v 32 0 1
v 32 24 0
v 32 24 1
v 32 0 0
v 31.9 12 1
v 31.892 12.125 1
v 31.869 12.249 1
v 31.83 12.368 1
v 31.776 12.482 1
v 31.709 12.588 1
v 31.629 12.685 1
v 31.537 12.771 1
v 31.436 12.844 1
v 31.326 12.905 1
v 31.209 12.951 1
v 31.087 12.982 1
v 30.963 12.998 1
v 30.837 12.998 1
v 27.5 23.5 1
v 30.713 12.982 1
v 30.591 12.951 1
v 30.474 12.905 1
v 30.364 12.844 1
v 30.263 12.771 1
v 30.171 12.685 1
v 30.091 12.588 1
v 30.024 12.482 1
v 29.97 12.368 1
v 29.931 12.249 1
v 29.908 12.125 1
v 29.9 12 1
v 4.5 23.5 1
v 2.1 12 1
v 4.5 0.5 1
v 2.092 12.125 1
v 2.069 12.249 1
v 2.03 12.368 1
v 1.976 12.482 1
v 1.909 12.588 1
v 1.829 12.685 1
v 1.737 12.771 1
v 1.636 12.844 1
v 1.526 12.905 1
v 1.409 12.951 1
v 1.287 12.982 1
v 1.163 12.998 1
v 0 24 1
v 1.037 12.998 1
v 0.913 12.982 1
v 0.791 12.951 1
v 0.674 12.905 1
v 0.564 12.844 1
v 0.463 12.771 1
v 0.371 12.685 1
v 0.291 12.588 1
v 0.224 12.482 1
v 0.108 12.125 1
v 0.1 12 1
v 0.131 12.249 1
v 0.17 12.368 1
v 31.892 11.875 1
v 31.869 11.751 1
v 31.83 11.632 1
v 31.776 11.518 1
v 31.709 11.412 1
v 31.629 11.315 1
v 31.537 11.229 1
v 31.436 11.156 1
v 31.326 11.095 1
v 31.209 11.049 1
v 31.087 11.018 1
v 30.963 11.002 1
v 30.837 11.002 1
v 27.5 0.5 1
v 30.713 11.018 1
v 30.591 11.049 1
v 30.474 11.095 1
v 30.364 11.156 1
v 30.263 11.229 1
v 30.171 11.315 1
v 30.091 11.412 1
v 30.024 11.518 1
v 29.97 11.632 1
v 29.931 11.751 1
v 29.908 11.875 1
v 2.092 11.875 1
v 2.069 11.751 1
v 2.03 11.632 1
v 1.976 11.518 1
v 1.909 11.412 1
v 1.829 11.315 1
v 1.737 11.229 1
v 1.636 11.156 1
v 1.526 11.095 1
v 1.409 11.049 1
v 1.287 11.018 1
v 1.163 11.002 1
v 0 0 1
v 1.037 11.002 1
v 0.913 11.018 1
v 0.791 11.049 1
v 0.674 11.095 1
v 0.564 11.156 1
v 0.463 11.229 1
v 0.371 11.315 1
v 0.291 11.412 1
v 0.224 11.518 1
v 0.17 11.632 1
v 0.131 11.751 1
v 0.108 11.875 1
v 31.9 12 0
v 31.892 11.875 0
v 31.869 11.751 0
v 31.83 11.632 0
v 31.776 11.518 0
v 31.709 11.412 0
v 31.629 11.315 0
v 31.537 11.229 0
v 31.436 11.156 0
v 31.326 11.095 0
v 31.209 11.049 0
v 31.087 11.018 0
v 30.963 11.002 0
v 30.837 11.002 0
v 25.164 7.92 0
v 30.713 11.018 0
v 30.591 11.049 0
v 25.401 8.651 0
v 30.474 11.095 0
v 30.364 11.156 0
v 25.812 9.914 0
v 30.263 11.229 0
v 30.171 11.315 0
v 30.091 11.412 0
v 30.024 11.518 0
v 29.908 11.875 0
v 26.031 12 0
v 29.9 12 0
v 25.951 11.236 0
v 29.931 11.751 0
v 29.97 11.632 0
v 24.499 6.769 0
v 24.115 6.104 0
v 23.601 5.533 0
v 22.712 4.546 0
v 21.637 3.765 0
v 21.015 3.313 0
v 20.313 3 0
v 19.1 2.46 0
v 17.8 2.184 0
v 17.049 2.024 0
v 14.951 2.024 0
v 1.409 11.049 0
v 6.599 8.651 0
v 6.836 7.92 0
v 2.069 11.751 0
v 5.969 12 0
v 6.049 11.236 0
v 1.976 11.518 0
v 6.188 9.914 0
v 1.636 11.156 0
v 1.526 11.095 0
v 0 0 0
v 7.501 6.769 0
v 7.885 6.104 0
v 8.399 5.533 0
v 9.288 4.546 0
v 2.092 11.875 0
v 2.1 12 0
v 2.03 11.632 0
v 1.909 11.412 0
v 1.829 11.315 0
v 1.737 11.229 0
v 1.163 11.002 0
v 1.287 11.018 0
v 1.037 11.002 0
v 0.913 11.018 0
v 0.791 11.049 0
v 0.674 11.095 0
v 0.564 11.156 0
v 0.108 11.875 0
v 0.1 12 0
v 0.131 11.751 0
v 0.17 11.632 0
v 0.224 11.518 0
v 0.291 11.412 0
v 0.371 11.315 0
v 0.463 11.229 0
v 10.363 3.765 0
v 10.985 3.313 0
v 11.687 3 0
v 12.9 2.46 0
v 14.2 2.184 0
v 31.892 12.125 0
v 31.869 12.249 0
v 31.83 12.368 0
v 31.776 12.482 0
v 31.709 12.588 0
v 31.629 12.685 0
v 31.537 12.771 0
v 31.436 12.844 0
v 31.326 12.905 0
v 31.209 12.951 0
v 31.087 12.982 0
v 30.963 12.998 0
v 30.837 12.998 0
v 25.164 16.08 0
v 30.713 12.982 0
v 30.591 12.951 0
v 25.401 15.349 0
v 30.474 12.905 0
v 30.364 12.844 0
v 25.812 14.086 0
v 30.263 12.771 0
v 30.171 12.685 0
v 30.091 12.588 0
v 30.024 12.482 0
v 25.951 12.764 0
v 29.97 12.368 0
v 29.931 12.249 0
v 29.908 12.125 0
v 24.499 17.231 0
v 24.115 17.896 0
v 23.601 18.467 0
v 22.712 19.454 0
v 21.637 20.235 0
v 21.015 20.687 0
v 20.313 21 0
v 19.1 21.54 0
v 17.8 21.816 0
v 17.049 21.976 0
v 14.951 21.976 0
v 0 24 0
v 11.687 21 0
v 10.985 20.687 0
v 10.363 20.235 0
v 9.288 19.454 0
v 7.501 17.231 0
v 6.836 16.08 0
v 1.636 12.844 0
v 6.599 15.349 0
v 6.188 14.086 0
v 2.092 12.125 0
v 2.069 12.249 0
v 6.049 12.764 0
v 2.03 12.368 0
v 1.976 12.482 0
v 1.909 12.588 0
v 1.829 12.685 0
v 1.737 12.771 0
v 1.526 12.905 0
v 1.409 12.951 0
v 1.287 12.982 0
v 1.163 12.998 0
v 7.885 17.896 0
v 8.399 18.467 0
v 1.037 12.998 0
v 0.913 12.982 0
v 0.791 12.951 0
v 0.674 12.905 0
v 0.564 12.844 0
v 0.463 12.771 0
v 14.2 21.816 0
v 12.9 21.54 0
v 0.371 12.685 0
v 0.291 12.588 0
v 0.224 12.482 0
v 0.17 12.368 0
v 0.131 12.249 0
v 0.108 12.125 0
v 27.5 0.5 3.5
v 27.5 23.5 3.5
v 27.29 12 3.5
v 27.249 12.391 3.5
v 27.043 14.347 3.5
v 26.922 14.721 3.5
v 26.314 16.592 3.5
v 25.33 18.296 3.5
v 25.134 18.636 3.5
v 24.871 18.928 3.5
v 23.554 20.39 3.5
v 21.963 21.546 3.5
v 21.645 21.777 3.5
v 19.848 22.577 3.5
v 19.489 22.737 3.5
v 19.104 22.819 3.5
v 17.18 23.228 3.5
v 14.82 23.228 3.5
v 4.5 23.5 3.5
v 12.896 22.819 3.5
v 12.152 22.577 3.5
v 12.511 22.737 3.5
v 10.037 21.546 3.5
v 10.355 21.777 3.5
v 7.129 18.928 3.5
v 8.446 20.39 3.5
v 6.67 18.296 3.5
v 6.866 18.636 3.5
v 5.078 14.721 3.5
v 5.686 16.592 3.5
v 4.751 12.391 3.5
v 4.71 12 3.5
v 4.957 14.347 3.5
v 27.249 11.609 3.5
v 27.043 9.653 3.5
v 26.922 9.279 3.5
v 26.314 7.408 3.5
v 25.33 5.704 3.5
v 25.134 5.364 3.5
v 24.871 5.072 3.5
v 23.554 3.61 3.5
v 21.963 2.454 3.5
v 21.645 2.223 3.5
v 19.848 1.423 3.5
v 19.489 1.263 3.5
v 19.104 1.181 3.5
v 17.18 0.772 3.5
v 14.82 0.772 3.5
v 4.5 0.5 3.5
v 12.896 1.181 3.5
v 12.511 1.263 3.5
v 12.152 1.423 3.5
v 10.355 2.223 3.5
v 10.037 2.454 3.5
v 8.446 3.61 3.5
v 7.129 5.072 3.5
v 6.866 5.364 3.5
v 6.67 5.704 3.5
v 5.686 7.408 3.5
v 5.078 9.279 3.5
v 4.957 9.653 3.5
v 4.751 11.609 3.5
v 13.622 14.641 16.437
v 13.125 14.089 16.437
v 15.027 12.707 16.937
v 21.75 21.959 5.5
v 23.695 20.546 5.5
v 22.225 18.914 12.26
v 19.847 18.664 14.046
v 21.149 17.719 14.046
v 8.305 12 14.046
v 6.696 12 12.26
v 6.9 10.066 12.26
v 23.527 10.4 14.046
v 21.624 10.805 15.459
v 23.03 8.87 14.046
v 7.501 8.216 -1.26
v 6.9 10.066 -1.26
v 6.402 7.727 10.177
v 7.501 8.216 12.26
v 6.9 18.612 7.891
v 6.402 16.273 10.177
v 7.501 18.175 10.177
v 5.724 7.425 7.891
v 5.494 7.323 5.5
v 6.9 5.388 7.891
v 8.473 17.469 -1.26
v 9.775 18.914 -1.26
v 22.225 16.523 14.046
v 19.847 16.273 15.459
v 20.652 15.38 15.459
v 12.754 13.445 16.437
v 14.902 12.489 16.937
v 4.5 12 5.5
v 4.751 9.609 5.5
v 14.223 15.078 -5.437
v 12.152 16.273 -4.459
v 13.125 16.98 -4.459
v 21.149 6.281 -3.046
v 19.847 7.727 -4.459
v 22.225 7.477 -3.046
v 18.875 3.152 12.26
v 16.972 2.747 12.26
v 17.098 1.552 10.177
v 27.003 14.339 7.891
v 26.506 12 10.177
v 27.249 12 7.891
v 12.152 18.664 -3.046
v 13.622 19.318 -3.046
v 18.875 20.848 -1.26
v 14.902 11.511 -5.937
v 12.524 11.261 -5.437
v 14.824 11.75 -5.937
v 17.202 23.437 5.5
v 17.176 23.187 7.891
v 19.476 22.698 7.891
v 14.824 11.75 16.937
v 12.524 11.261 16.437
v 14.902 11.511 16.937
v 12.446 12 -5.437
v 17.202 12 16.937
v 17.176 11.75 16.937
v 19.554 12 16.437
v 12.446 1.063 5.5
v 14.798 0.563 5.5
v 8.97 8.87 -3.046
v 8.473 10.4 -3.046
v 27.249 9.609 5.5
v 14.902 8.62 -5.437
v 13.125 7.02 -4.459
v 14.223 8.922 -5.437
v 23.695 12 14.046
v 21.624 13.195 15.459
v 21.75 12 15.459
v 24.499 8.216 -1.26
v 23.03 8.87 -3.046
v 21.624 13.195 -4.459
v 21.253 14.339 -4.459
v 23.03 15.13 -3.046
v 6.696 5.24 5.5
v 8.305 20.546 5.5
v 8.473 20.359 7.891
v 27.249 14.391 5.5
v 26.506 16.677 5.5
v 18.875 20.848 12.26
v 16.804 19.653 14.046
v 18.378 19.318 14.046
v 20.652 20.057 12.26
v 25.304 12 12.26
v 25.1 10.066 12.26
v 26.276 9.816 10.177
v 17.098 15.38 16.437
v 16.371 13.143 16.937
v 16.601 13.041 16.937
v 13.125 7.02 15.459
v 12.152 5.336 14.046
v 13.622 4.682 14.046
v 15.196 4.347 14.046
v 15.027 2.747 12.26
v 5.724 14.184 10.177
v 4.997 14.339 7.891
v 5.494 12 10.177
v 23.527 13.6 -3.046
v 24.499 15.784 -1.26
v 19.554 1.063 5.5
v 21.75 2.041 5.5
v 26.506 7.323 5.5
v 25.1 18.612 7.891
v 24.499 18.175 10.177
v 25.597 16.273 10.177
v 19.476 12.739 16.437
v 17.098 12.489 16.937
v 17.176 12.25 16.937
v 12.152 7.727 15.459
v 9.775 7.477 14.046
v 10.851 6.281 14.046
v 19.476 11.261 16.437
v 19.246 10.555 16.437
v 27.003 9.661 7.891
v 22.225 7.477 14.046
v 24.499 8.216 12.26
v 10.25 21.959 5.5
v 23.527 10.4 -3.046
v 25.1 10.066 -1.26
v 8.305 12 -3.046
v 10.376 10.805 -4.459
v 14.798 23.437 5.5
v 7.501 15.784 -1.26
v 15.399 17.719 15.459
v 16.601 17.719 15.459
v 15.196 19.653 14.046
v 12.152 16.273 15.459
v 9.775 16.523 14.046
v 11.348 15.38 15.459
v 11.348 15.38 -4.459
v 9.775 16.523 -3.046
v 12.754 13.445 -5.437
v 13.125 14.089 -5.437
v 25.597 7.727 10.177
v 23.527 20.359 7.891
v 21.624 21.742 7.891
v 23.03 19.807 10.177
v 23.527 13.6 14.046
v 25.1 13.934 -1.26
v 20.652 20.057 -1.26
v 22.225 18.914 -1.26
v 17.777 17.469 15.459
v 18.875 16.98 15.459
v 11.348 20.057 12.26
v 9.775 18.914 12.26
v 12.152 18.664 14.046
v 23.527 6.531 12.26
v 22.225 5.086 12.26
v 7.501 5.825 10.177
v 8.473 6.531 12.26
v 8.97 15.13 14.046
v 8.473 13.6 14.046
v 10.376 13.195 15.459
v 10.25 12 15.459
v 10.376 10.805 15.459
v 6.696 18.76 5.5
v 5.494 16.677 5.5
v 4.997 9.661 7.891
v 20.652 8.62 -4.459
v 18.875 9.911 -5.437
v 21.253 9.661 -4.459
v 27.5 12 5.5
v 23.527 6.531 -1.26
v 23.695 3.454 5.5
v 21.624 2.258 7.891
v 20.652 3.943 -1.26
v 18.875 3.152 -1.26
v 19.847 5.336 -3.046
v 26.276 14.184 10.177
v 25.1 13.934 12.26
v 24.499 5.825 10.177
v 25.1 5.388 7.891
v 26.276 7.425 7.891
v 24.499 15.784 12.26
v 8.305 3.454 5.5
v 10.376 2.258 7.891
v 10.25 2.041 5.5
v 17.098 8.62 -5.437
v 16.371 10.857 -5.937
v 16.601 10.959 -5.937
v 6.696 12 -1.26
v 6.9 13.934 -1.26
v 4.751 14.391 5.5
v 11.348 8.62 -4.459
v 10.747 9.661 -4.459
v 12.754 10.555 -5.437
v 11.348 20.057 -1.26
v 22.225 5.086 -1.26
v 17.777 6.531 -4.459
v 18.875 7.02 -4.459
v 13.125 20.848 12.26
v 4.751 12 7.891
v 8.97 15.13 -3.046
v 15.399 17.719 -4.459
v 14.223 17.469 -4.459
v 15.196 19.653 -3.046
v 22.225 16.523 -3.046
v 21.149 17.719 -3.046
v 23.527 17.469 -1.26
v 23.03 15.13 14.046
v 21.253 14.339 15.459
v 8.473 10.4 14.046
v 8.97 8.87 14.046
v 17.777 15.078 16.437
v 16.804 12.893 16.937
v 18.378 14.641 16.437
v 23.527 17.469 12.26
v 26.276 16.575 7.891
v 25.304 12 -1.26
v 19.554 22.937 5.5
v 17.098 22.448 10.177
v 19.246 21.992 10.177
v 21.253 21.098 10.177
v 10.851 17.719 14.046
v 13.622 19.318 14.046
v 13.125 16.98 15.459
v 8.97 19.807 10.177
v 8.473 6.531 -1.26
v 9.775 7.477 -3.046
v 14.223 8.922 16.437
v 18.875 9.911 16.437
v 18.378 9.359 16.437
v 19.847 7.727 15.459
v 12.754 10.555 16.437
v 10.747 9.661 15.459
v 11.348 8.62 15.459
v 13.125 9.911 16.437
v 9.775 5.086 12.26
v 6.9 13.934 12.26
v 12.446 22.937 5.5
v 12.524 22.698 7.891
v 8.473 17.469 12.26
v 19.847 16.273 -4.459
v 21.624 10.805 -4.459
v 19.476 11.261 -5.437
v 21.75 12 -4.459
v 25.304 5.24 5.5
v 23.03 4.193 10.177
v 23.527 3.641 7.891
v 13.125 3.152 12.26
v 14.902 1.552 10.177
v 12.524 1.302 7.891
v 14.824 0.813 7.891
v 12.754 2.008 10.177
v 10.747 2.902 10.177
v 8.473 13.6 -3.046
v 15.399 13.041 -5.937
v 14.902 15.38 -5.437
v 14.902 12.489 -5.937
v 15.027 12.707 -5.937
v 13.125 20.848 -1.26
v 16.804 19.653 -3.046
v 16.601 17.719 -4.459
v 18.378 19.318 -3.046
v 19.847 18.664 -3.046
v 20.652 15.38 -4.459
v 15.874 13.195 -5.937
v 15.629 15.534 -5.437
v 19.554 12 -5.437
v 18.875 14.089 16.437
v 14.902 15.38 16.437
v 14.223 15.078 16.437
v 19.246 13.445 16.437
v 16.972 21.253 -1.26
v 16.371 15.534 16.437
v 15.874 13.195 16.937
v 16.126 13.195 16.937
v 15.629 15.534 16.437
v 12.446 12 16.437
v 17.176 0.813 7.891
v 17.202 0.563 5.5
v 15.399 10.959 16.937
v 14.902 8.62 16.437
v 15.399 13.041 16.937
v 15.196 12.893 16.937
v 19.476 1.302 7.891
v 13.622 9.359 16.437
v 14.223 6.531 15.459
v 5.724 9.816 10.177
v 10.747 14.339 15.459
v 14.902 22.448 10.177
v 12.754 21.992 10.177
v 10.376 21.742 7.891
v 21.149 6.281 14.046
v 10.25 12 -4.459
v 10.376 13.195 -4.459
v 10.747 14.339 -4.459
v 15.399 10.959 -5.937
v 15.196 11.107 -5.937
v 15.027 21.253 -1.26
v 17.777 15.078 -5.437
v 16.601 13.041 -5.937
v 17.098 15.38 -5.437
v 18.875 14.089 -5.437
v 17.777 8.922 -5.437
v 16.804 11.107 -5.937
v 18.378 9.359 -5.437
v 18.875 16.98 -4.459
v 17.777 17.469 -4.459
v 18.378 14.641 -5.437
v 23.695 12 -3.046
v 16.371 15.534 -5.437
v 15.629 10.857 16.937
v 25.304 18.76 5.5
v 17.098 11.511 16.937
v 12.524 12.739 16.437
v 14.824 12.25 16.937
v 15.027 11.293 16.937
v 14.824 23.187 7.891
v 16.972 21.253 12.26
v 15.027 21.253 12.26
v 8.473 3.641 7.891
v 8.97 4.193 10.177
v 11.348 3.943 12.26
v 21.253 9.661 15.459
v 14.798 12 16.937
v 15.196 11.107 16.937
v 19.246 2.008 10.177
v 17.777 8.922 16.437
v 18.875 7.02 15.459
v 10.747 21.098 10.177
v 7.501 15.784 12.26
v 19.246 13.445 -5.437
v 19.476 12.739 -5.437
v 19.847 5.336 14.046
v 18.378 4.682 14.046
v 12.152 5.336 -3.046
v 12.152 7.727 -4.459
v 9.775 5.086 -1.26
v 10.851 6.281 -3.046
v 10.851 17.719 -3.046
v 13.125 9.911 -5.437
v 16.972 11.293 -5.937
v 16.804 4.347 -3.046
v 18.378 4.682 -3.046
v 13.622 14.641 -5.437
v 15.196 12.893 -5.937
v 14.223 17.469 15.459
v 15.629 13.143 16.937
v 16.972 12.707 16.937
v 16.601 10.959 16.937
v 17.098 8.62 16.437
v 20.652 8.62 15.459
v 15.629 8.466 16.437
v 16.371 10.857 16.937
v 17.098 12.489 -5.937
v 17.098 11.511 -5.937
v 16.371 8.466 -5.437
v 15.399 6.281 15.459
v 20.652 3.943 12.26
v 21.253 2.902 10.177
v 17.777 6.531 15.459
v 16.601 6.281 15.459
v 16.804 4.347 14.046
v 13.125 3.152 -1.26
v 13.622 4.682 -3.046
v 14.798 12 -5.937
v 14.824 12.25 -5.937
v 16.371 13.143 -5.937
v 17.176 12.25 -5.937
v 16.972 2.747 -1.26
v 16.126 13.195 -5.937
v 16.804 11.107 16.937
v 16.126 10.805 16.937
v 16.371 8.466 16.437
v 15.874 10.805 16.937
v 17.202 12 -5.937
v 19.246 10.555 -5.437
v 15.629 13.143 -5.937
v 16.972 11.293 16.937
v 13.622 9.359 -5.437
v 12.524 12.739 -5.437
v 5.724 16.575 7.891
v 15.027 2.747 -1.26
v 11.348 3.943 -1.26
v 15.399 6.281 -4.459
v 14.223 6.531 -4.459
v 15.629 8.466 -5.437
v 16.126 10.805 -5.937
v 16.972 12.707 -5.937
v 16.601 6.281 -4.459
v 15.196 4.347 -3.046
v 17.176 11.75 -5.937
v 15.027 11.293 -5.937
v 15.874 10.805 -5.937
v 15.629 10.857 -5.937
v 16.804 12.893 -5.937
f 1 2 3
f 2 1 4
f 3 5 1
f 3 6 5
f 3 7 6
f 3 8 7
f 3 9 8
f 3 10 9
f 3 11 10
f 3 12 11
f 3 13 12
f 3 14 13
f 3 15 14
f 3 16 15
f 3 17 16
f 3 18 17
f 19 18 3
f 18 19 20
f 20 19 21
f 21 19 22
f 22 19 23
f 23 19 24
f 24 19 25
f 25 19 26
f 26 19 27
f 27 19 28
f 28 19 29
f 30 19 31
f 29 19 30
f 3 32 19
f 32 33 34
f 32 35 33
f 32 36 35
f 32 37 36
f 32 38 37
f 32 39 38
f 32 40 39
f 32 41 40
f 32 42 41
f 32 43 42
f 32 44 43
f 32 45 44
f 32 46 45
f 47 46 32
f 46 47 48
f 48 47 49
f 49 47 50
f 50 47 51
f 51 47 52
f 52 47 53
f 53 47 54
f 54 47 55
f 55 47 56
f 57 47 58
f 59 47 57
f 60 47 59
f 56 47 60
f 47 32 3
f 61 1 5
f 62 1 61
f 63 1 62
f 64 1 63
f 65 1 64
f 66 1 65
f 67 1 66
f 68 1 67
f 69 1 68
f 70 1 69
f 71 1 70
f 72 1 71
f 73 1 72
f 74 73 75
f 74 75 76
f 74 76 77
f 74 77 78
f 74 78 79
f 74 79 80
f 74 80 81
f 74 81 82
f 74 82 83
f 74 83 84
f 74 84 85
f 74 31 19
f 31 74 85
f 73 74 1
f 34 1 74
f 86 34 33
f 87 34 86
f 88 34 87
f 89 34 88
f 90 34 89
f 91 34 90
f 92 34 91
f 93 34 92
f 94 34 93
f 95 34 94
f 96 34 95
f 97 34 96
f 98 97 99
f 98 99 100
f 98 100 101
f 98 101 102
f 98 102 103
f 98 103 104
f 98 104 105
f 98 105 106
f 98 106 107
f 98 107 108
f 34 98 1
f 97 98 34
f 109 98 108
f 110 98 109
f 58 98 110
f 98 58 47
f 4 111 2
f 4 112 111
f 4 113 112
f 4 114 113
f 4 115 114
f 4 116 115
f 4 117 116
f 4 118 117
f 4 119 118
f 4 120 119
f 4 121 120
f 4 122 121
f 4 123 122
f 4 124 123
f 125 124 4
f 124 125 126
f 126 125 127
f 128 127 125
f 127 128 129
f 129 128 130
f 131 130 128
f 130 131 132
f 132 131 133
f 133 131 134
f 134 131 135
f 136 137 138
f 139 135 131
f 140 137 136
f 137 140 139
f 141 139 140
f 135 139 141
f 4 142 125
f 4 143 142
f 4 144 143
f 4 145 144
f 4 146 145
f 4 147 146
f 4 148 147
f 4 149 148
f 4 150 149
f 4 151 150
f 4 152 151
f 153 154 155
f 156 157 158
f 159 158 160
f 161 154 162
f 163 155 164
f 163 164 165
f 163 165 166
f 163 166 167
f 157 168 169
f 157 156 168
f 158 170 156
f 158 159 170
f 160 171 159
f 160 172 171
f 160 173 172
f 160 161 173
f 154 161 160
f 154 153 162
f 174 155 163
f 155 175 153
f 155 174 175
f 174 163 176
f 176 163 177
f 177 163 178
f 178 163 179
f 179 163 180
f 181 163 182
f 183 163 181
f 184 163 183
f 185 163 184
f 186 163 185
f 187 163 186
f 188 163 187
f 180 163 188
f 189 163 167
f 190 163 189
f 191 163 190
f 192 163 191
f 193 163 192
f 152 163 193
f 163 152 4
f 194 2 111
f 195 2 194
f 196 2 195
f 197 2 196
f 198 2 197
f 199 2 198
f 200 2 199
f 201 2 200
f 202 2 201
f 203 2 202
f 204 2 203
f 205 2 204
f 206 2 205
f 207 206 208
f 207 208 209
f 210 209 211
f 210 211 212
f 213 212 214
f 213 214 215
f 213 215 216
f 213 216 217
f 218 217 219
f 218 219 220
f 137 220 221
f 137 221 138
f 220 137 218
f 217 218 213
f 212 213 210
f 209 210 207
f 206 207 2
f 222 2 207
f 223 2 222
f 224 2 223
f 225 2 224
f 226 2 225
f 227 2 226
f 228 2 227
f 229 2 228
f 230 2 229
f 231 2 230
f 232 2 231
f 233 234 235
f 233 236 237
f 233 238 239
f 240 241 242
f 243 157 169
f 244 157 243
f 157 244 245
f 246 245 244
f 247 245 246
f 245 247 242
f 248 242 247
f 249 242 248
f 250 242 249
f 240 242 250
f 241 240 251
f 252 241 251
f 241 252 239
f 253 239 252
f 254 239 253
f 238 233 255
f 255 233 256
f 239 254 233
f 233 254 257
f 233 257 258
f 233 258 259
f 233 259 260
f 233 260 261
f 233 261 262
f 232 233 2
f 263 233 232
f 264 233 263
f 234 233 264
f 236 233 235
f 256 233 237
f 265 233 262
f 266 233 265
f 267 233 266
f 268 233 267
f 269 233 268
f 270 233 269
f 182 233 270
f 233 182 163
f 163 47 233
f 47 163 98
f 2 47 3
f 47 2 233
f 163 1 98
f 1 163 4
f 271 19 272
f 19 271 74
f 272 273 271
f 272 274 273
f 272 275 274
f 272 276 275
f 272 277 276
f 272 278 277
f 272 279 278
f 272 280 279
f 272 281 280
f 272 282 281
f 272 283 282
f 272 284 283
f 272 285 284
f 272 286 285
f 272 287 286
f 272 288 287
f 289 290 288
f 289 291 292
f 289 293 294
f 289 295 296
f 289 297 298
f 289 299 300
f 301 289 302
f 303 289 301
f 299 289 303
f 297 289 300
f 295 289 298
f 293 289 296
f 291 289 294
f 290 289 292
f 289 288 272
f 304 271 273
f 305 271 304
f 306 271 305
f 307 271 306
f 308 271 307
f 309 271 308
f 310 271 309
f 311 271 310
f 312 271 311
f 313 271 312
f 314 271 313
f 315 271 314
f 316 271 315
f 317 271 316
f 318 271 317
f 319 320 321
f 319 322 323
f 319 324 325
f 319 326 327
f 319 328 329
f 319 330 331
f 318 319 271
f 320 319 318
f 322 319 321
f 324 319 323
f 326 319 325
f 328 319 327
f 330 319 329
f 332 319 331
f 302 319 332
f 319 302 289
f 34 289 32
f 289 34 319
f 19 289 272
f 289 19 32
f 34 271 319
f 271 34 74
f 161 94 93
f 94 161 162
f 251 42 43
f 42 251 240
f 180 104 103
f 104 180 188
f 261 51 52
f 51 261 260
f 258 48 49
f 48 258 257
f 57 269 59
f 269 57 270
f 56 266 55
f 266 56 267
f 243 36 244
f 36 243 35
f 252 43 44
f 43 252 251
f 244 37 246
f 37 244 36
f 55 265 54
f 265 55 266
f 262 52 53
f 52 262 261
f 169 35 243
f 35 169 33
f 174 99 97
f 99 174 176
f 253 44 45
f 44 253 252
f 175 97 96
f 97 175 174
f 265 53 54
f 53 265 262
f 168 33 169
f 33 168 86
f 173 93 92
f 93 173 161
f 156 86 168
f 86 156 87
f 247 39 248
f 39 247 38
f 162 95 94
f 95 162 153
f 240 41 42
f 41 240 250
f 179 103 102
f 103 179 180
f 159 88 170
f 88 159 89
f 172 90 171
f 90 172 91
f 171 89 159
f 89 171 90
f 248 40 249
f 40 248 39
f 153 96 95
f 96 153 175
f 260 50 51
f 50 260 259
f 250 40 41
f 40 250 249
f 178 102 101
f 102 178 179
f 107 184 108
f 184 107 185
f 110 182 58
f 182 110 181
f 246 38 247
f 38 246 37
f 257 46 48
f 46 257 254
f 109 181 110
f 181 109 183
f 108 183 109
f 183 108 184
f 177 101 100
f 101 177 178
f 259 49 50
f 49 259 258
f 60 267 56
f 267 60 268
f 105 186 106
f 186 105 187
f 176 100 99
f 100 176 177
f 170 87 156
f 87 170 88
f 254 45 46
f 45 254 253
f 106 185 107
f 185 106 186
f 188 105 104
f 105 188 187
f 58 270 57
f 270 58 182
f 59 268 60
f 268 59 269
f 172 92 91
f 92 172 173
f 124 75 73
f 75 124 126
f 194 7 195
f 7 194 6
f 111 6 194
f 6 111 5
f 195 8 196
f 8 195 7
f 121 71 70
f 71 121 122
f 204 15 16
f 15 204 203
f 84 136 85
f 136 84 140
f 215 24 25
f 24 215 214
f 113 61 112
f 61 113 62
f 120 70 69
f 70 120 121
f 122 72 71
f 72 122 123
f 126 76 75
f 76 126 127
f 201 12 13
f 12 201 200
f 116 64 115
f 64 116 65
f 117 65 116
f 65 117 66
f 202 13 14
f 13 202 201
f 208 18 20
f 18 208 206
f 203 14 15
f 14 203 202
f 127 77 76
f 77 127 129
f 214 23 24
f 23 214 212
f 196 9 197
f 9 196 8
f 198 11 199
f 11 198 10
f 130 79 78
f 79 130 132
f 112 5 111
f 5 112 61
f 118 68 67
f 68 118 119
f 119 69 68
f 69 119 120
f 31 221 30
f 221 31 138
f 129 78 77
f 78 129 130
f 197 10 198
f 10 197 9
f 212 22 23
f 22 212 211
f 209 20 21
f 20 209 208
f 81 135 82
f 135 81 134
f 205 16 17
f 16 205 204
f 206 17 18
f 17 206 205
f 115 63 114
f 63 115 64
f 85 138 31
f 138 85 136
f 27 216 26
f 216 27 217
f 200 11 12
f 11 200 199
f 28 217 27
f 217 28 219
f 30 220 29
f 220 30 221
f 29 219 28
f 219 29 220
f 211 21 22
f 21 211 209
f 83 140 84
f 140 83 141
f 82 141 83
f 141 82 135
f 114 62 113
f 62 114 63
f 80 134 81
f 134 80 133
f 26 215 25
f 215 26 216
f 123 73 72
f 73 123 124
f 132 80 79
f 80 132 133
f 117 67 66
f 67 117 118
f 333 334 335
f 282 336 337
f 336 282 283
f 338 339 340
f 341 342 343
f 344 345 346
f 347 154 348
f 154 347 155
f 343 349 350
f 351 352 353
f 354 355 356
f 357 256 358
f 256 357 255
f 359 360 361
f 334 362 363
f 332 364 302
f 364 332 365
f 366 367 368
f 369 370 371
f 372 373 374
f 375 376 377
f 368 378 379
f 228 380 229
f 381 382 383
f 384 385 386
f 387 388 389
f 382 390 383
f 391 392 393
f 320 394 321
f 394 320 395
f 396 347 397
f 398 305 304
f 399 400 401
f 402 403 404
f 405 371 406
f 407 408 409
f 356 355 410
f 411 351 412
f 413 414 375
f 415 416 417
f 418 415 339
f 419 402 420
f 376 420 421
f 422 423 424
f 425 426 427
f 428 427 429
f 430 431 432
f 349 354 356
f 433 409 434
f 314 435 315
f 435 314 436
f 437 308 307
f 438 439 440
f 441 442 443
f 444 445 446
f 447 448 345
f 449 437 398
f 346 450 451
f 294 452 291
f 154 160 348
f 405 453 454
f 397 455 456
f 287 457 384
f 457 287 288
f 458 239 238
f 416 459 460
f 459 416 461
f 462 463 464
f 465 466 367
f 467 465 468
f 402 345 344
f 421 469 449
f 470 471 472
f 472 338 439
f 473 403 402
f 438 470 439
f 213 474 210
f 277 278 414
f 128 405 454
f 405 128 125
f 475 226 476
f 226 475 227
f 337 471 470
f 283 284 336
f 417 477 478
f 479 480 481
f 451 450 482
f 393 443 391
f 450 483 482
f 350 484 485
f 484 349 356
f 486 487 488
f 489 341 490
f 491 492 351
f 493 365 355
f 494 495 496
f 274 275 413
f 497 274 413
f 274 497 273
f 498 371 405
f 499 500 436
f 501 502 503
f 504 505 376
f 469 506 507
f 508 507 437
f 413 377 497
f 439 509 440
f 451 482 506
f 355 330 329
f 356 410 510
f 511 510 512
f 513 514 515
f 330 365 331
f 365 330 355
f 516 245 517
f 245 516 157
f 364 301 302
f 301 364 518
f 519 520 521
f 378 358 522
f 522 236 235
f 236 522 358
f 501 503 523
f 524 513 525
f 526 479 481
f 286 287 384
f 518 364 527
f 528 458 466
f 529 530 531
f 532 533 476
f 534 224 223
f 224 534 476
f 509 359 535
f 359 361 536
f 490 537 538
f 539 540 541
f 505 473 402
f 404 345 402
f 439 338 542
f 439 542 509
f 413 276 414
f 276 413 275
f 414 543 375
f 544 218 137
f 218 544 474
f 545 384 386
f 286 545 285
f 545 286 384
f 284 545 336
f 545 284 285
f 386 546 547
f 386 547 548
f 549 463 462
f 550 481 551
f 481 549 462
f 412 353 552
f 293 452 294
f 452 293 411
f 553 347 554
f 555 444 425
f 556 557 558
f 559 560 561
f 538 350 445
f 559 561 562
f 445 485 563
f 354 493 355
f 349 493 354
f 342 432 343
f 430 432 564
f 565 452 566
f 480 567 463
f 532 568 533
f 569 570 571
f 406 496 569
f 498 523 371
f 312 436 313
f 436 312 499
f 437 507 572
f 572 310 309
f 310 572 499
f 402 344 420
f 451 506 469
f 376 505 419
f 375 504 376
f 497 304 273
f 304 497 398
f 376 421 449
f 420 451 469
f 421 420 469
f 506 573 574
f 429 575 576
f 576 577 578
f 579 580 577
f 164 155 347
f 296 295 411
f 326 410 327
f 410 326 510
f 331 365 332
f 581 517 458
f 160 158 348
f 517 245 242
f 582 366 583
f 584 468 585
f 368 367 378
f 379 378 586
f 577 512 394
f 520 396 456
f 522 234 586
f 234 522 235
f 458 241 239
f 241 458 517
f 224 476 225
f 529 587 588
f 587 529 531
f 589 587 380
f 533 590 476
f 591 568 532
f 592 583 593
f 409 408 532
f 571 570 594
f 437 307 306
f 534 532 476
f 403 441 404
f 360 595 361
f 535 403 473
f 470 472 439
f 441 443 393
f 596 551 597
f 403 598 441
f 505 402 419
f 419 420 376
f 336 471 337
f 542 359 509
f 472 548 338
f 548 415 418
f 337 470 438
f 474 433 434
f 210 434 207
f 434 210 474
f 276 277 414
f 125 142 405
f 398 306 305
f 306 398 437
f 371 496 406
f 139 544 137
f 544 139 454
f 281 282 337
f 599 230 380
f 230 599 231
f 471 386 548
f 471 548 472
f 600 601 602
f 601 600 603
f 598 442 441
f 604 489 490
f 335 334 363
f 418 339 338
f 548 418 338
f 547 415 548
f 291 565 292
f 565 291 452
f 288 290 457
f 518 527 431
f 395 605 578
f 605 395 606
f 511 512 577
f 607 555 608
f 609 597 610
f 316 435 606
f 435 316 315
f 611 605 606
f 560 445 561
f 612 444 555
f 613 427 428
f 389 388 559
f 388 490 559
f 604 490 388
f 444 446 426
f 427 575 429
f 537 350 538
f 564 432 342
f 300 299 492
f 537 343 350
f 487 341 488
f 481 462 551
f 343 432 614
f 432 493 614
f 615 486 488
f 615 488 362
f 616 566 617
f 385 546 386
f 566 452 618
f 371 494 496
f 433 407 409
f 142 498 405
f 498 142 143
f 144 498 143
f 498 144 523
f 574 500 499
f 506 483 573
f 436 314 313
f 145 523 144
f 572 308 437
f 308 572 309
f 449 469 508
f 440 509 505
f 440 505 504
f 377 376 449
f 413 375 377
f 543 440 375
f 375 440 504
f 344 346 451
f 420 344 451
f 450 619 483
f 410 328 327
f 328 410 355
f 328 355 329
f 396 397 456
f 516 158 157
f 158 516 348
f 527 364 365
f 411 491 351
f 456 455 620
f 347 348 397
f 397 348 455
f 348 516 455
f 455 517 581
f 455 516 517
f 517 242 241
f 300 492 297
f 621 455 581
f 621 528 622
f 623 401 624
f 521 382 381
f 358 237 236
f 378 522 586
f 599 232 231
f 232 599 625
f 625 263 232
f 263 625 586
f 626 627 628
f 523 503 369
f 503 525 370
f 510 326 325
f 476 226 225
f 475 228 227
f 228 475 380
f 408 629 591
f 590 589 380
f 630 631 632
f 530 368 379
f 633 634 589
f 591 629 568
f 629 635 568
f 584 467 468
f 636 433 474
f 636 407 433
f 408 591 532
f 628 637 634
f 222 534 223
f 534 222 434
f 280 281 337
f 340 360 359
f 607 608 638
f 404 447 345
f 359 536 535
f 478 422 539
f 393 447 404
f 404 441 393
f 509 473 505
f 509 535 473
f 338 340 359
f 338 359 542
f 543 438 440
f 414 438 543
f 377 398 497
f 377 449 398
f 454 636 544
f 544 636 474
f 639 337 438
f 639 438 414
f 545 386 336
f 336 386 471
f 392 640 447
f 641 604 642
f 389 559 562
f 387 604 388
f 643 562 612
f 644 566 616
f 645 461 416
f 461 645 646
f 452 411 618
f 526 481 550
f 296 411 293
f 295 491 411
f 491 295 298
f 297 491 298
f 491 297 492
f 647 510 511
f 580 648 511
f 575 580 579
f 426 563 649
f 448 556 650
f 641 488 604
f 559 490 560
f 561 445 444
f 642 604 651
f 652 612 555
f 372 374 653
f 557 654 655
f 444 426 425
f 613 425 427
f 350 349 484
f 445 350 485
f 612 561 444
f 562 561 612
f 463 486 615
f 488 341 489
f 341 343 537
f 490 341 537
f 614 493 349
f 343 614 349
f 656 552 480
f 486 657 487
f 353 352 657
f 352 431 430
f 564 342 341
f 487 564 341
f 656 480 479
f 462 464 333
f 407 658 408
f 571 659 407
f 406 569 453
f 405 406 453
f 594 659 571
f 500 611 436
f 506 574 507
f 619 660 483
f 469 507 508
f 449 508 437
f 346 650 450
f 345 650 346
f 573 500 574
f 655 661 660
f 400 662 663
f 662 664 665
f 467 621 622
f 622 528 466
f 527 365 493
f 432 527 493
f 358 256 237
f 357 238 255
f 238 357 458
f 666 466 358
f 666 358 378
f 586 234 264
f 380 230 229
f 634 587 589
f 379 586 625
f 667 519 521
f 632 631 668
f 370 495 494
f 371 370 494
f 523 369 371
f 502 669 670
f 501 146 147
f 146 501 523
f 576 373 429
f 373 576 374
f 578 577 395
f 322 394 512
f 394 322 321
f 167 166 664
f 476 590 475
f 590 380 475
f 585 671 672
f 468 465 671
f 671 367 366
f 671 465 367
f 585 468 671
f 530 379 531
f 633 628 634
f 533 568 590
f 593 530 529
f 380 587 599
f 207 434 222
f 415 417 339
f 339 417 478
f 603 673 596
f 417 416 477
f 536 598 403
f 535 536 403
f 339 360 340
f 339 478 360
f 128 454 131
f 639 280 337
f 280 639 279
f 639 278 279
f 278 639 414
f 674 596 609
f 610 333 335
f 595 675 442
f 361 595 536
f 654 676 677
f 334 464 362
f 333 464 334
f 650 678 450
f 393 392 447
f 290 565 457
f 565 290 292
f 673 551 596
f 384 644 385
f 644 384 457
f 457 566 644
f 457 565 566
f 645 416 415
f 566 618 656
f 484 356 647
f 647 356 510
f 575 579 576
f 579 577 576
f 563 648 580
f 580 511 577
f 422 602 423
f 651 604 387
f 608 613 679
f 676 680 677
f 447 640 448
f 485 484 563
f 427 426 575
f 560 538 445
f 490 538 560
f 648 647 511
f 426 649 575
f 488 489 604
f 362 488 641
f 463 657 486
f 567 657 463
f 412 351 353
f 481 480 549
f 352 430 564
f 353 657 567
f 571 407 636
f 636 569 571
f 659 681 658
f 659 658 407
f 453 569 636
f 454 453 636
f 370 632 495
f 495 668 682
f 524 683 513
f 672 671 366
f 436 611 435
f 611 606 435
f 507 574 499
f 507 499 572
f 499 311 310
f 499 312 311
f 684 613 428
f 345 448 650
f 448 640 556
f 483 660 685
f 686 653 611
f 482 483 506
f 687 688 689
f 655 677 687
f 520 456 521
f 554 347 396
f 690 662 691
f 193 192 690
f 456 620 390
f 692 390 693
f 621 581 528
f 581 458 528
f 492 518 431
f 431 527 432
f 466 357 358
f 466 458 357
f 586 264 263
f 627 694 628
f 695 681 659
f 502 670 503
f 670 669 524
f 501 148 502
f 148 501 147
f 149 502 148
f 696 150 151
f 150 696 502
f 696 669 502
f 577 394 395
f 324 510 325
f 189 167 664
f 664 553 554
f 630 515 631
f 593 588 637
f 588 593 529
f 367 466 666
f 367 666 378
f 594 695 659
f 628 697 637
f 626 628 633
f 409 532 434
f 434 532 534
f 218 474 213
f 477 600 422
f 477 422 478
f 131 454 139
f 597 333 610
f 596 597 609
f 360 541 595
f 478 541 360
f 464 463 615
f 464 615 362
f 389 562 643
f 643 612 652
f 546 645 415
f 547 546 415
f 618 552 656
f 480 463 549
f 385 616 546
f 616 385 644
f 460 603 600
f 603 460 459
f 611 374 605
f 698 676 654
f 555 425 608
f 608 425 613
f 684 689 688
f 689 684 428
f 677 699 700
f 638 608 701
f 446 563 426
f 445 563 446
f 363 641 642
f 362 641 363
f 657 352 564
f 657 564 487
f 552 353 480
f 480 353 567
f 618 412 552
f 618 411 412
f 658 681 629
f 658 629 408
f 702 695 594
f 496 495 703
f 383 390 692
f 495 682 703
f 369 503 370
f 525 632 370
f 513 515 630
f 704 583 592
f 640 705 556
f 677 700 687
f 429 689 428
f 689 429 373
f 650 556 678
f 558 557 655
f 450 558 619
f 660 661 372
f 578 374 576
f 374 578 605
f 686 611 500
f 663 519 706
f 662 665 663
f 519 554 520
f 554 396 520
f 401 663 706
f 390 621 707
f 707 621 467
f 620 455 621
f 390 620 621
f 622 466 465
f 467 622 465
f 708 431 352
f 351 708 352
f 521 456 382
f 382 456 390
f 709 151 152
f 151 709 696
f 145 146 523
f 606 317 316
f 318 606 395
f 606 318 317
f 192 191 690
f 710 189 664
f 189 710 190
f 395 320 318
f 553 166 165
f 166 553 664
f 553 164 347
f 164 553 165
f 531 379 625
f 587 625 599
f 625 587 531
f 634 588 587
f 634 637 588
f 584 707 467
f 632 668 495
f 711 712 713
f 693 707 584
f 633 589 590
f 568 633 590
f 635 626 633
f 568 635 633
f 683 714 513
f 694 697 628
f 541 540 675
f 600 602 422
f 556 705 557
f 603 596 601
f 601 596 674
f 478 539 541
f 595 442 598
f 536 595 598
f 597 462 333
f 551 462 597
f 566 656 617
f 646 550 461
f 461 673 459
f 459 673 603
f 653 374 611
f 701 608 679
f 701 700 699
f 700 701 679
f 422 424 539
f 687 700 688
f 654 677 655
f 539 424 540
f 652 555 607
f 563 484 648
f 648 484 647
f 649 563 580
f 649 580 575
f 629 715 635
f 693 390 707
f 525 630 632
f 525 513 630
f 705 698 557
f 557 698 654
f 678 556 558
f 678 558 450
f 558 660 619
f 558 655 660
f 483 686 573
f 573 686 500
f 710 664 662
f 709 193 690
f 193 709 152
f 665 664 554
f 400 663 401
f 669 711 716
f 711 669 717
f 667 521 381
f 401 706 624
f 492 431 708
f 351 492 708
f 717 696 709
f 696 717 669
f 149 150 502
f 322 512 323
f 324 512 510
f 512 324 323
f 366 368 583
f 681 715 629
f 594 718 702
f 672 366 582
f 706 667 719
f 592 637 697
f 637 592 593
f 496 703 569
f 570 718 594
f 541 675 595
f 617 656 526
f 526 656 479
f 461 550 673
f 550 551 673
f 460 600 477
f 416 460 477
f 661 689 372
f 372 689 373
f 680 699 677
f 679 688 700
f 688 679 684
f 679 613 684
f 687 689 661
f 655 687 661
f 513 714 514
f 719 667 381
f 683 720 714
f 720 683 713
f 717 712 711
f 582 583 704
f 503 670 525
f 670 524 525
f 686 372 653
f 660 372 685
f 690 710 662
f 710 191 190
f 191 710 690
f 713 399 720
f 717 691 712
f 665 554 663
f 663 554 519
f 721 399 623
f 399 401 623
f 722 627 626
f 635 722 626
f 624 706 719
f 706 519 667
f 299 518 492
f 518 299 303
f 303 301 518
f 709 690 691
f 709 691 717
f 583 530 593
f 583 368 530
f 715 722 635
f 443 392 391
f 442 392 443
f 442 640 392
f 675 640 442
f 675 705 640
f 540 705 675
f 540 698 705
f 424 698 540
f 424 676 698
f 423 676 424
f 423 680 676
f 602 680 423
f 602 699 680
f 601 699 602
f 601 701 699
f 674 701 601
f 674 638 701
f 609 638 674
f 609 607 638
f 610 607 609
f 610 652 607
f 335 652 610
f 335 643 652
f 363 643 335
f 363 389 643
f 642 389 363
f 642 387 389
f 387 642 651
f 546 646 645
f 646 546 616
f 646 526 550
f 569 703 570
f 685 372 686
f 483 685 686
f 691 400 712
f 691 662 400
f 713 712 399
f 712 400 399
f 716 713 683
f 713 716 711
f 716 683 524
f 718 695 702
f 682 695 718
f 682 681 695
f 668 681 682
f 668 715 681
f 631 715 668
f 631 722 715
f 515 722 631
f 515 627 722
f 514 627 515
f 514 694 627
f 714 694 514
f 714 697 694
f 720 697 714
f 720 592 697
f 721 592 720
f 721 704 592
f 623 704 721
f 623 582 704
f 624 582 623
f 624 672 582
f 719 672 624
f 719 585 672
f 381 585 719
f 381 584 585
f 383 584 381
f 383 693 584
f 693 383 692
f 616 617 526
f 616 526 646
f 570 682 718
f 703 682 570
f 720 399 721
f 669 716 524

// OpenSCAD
function adafruit_pir_board_width() = 32;
function adafruit_pir_board_height() = 24;
function adafruit_pir_board_depth() = 1;
function adafruit_pir_screw_hole_to_side() = 0.1;
function adafruit_pir_screw_hole_radius() = 1;
function adafruit_pir_diffuser_square_size() = 23;
function adafruit_pir_diffuser_square_depth() = 2.5;
function adafruit_pir_diffuser_sphere_circumference() = 22;
function adafruit_pir_diffuser_sphere_height() = 12;

module adafruit_pir() {
    board_h = adafruit_pir_board_height();
    board_w = adafruit_pir_board_width();
    board_d = adafruit_pir_board_depth();

    difference() {
        union() {
            // board
            color("DarkGreen")
            cube([board_w, board_h, board_d]);

            // top part
            base_s = adafruit_pir_diffuser_square_size();
            base_d = adafruit_pir_diffuser_square_depth();
            sphere_c = adafruit_pir_diffuser_sphere_circumference();
            sphere_h = adafruit_pir_diffuser_sphere_height();
            translate([(board_w - base_s) / 2, (board_h - base_s) / 2, board_d])
                cube([base_s, base_s, base_d]);
            difference() {
                translate([board_w / 2, board_h / 2, board_d + base_d + 2])
                    sphere(r=sphere_c / 2);
                translate([0, 0, -sphere_c + 1])
                    cube([board_w, board_h, sphere_c]);
            }
        }

        // through holes
        hole_radius = adafruit_pir_screw_hole_radius();
        hole_to_side = adafruit_pir_screw_hole_to_side();
        translate([hole_radius + hole_to_side, board_h / 2, -0.1])
            cylinder(r = hole_radius, h = board_d * 2, $fn=50);
        translate([board_w - hole_radius - hole_to_side, board_h / 2, -0.1])
            cylinder(r = hole_radius, h = board_d * 2, $fn=50);
    }
}

module adafruit_pir_cutout() {
    board_h = adafruit_pir_board_height();
    board_w = adafruit_pir_board_width();
    board_d = adafruit_pir_board_depth();
    base_d = adafruit_pir_diffuser_square_depth();
    sphere_c = adafruit_pir_diffuser_sphere_circumference() + 1;

    color("Red", 0.5) {
        translate([board_w / 2, board_h / 2, board_d + base_d + 2])
            sphere(r=sphere_c / 2);
    }
}

adafruit_pir();
adafruit_pir_cutout();
